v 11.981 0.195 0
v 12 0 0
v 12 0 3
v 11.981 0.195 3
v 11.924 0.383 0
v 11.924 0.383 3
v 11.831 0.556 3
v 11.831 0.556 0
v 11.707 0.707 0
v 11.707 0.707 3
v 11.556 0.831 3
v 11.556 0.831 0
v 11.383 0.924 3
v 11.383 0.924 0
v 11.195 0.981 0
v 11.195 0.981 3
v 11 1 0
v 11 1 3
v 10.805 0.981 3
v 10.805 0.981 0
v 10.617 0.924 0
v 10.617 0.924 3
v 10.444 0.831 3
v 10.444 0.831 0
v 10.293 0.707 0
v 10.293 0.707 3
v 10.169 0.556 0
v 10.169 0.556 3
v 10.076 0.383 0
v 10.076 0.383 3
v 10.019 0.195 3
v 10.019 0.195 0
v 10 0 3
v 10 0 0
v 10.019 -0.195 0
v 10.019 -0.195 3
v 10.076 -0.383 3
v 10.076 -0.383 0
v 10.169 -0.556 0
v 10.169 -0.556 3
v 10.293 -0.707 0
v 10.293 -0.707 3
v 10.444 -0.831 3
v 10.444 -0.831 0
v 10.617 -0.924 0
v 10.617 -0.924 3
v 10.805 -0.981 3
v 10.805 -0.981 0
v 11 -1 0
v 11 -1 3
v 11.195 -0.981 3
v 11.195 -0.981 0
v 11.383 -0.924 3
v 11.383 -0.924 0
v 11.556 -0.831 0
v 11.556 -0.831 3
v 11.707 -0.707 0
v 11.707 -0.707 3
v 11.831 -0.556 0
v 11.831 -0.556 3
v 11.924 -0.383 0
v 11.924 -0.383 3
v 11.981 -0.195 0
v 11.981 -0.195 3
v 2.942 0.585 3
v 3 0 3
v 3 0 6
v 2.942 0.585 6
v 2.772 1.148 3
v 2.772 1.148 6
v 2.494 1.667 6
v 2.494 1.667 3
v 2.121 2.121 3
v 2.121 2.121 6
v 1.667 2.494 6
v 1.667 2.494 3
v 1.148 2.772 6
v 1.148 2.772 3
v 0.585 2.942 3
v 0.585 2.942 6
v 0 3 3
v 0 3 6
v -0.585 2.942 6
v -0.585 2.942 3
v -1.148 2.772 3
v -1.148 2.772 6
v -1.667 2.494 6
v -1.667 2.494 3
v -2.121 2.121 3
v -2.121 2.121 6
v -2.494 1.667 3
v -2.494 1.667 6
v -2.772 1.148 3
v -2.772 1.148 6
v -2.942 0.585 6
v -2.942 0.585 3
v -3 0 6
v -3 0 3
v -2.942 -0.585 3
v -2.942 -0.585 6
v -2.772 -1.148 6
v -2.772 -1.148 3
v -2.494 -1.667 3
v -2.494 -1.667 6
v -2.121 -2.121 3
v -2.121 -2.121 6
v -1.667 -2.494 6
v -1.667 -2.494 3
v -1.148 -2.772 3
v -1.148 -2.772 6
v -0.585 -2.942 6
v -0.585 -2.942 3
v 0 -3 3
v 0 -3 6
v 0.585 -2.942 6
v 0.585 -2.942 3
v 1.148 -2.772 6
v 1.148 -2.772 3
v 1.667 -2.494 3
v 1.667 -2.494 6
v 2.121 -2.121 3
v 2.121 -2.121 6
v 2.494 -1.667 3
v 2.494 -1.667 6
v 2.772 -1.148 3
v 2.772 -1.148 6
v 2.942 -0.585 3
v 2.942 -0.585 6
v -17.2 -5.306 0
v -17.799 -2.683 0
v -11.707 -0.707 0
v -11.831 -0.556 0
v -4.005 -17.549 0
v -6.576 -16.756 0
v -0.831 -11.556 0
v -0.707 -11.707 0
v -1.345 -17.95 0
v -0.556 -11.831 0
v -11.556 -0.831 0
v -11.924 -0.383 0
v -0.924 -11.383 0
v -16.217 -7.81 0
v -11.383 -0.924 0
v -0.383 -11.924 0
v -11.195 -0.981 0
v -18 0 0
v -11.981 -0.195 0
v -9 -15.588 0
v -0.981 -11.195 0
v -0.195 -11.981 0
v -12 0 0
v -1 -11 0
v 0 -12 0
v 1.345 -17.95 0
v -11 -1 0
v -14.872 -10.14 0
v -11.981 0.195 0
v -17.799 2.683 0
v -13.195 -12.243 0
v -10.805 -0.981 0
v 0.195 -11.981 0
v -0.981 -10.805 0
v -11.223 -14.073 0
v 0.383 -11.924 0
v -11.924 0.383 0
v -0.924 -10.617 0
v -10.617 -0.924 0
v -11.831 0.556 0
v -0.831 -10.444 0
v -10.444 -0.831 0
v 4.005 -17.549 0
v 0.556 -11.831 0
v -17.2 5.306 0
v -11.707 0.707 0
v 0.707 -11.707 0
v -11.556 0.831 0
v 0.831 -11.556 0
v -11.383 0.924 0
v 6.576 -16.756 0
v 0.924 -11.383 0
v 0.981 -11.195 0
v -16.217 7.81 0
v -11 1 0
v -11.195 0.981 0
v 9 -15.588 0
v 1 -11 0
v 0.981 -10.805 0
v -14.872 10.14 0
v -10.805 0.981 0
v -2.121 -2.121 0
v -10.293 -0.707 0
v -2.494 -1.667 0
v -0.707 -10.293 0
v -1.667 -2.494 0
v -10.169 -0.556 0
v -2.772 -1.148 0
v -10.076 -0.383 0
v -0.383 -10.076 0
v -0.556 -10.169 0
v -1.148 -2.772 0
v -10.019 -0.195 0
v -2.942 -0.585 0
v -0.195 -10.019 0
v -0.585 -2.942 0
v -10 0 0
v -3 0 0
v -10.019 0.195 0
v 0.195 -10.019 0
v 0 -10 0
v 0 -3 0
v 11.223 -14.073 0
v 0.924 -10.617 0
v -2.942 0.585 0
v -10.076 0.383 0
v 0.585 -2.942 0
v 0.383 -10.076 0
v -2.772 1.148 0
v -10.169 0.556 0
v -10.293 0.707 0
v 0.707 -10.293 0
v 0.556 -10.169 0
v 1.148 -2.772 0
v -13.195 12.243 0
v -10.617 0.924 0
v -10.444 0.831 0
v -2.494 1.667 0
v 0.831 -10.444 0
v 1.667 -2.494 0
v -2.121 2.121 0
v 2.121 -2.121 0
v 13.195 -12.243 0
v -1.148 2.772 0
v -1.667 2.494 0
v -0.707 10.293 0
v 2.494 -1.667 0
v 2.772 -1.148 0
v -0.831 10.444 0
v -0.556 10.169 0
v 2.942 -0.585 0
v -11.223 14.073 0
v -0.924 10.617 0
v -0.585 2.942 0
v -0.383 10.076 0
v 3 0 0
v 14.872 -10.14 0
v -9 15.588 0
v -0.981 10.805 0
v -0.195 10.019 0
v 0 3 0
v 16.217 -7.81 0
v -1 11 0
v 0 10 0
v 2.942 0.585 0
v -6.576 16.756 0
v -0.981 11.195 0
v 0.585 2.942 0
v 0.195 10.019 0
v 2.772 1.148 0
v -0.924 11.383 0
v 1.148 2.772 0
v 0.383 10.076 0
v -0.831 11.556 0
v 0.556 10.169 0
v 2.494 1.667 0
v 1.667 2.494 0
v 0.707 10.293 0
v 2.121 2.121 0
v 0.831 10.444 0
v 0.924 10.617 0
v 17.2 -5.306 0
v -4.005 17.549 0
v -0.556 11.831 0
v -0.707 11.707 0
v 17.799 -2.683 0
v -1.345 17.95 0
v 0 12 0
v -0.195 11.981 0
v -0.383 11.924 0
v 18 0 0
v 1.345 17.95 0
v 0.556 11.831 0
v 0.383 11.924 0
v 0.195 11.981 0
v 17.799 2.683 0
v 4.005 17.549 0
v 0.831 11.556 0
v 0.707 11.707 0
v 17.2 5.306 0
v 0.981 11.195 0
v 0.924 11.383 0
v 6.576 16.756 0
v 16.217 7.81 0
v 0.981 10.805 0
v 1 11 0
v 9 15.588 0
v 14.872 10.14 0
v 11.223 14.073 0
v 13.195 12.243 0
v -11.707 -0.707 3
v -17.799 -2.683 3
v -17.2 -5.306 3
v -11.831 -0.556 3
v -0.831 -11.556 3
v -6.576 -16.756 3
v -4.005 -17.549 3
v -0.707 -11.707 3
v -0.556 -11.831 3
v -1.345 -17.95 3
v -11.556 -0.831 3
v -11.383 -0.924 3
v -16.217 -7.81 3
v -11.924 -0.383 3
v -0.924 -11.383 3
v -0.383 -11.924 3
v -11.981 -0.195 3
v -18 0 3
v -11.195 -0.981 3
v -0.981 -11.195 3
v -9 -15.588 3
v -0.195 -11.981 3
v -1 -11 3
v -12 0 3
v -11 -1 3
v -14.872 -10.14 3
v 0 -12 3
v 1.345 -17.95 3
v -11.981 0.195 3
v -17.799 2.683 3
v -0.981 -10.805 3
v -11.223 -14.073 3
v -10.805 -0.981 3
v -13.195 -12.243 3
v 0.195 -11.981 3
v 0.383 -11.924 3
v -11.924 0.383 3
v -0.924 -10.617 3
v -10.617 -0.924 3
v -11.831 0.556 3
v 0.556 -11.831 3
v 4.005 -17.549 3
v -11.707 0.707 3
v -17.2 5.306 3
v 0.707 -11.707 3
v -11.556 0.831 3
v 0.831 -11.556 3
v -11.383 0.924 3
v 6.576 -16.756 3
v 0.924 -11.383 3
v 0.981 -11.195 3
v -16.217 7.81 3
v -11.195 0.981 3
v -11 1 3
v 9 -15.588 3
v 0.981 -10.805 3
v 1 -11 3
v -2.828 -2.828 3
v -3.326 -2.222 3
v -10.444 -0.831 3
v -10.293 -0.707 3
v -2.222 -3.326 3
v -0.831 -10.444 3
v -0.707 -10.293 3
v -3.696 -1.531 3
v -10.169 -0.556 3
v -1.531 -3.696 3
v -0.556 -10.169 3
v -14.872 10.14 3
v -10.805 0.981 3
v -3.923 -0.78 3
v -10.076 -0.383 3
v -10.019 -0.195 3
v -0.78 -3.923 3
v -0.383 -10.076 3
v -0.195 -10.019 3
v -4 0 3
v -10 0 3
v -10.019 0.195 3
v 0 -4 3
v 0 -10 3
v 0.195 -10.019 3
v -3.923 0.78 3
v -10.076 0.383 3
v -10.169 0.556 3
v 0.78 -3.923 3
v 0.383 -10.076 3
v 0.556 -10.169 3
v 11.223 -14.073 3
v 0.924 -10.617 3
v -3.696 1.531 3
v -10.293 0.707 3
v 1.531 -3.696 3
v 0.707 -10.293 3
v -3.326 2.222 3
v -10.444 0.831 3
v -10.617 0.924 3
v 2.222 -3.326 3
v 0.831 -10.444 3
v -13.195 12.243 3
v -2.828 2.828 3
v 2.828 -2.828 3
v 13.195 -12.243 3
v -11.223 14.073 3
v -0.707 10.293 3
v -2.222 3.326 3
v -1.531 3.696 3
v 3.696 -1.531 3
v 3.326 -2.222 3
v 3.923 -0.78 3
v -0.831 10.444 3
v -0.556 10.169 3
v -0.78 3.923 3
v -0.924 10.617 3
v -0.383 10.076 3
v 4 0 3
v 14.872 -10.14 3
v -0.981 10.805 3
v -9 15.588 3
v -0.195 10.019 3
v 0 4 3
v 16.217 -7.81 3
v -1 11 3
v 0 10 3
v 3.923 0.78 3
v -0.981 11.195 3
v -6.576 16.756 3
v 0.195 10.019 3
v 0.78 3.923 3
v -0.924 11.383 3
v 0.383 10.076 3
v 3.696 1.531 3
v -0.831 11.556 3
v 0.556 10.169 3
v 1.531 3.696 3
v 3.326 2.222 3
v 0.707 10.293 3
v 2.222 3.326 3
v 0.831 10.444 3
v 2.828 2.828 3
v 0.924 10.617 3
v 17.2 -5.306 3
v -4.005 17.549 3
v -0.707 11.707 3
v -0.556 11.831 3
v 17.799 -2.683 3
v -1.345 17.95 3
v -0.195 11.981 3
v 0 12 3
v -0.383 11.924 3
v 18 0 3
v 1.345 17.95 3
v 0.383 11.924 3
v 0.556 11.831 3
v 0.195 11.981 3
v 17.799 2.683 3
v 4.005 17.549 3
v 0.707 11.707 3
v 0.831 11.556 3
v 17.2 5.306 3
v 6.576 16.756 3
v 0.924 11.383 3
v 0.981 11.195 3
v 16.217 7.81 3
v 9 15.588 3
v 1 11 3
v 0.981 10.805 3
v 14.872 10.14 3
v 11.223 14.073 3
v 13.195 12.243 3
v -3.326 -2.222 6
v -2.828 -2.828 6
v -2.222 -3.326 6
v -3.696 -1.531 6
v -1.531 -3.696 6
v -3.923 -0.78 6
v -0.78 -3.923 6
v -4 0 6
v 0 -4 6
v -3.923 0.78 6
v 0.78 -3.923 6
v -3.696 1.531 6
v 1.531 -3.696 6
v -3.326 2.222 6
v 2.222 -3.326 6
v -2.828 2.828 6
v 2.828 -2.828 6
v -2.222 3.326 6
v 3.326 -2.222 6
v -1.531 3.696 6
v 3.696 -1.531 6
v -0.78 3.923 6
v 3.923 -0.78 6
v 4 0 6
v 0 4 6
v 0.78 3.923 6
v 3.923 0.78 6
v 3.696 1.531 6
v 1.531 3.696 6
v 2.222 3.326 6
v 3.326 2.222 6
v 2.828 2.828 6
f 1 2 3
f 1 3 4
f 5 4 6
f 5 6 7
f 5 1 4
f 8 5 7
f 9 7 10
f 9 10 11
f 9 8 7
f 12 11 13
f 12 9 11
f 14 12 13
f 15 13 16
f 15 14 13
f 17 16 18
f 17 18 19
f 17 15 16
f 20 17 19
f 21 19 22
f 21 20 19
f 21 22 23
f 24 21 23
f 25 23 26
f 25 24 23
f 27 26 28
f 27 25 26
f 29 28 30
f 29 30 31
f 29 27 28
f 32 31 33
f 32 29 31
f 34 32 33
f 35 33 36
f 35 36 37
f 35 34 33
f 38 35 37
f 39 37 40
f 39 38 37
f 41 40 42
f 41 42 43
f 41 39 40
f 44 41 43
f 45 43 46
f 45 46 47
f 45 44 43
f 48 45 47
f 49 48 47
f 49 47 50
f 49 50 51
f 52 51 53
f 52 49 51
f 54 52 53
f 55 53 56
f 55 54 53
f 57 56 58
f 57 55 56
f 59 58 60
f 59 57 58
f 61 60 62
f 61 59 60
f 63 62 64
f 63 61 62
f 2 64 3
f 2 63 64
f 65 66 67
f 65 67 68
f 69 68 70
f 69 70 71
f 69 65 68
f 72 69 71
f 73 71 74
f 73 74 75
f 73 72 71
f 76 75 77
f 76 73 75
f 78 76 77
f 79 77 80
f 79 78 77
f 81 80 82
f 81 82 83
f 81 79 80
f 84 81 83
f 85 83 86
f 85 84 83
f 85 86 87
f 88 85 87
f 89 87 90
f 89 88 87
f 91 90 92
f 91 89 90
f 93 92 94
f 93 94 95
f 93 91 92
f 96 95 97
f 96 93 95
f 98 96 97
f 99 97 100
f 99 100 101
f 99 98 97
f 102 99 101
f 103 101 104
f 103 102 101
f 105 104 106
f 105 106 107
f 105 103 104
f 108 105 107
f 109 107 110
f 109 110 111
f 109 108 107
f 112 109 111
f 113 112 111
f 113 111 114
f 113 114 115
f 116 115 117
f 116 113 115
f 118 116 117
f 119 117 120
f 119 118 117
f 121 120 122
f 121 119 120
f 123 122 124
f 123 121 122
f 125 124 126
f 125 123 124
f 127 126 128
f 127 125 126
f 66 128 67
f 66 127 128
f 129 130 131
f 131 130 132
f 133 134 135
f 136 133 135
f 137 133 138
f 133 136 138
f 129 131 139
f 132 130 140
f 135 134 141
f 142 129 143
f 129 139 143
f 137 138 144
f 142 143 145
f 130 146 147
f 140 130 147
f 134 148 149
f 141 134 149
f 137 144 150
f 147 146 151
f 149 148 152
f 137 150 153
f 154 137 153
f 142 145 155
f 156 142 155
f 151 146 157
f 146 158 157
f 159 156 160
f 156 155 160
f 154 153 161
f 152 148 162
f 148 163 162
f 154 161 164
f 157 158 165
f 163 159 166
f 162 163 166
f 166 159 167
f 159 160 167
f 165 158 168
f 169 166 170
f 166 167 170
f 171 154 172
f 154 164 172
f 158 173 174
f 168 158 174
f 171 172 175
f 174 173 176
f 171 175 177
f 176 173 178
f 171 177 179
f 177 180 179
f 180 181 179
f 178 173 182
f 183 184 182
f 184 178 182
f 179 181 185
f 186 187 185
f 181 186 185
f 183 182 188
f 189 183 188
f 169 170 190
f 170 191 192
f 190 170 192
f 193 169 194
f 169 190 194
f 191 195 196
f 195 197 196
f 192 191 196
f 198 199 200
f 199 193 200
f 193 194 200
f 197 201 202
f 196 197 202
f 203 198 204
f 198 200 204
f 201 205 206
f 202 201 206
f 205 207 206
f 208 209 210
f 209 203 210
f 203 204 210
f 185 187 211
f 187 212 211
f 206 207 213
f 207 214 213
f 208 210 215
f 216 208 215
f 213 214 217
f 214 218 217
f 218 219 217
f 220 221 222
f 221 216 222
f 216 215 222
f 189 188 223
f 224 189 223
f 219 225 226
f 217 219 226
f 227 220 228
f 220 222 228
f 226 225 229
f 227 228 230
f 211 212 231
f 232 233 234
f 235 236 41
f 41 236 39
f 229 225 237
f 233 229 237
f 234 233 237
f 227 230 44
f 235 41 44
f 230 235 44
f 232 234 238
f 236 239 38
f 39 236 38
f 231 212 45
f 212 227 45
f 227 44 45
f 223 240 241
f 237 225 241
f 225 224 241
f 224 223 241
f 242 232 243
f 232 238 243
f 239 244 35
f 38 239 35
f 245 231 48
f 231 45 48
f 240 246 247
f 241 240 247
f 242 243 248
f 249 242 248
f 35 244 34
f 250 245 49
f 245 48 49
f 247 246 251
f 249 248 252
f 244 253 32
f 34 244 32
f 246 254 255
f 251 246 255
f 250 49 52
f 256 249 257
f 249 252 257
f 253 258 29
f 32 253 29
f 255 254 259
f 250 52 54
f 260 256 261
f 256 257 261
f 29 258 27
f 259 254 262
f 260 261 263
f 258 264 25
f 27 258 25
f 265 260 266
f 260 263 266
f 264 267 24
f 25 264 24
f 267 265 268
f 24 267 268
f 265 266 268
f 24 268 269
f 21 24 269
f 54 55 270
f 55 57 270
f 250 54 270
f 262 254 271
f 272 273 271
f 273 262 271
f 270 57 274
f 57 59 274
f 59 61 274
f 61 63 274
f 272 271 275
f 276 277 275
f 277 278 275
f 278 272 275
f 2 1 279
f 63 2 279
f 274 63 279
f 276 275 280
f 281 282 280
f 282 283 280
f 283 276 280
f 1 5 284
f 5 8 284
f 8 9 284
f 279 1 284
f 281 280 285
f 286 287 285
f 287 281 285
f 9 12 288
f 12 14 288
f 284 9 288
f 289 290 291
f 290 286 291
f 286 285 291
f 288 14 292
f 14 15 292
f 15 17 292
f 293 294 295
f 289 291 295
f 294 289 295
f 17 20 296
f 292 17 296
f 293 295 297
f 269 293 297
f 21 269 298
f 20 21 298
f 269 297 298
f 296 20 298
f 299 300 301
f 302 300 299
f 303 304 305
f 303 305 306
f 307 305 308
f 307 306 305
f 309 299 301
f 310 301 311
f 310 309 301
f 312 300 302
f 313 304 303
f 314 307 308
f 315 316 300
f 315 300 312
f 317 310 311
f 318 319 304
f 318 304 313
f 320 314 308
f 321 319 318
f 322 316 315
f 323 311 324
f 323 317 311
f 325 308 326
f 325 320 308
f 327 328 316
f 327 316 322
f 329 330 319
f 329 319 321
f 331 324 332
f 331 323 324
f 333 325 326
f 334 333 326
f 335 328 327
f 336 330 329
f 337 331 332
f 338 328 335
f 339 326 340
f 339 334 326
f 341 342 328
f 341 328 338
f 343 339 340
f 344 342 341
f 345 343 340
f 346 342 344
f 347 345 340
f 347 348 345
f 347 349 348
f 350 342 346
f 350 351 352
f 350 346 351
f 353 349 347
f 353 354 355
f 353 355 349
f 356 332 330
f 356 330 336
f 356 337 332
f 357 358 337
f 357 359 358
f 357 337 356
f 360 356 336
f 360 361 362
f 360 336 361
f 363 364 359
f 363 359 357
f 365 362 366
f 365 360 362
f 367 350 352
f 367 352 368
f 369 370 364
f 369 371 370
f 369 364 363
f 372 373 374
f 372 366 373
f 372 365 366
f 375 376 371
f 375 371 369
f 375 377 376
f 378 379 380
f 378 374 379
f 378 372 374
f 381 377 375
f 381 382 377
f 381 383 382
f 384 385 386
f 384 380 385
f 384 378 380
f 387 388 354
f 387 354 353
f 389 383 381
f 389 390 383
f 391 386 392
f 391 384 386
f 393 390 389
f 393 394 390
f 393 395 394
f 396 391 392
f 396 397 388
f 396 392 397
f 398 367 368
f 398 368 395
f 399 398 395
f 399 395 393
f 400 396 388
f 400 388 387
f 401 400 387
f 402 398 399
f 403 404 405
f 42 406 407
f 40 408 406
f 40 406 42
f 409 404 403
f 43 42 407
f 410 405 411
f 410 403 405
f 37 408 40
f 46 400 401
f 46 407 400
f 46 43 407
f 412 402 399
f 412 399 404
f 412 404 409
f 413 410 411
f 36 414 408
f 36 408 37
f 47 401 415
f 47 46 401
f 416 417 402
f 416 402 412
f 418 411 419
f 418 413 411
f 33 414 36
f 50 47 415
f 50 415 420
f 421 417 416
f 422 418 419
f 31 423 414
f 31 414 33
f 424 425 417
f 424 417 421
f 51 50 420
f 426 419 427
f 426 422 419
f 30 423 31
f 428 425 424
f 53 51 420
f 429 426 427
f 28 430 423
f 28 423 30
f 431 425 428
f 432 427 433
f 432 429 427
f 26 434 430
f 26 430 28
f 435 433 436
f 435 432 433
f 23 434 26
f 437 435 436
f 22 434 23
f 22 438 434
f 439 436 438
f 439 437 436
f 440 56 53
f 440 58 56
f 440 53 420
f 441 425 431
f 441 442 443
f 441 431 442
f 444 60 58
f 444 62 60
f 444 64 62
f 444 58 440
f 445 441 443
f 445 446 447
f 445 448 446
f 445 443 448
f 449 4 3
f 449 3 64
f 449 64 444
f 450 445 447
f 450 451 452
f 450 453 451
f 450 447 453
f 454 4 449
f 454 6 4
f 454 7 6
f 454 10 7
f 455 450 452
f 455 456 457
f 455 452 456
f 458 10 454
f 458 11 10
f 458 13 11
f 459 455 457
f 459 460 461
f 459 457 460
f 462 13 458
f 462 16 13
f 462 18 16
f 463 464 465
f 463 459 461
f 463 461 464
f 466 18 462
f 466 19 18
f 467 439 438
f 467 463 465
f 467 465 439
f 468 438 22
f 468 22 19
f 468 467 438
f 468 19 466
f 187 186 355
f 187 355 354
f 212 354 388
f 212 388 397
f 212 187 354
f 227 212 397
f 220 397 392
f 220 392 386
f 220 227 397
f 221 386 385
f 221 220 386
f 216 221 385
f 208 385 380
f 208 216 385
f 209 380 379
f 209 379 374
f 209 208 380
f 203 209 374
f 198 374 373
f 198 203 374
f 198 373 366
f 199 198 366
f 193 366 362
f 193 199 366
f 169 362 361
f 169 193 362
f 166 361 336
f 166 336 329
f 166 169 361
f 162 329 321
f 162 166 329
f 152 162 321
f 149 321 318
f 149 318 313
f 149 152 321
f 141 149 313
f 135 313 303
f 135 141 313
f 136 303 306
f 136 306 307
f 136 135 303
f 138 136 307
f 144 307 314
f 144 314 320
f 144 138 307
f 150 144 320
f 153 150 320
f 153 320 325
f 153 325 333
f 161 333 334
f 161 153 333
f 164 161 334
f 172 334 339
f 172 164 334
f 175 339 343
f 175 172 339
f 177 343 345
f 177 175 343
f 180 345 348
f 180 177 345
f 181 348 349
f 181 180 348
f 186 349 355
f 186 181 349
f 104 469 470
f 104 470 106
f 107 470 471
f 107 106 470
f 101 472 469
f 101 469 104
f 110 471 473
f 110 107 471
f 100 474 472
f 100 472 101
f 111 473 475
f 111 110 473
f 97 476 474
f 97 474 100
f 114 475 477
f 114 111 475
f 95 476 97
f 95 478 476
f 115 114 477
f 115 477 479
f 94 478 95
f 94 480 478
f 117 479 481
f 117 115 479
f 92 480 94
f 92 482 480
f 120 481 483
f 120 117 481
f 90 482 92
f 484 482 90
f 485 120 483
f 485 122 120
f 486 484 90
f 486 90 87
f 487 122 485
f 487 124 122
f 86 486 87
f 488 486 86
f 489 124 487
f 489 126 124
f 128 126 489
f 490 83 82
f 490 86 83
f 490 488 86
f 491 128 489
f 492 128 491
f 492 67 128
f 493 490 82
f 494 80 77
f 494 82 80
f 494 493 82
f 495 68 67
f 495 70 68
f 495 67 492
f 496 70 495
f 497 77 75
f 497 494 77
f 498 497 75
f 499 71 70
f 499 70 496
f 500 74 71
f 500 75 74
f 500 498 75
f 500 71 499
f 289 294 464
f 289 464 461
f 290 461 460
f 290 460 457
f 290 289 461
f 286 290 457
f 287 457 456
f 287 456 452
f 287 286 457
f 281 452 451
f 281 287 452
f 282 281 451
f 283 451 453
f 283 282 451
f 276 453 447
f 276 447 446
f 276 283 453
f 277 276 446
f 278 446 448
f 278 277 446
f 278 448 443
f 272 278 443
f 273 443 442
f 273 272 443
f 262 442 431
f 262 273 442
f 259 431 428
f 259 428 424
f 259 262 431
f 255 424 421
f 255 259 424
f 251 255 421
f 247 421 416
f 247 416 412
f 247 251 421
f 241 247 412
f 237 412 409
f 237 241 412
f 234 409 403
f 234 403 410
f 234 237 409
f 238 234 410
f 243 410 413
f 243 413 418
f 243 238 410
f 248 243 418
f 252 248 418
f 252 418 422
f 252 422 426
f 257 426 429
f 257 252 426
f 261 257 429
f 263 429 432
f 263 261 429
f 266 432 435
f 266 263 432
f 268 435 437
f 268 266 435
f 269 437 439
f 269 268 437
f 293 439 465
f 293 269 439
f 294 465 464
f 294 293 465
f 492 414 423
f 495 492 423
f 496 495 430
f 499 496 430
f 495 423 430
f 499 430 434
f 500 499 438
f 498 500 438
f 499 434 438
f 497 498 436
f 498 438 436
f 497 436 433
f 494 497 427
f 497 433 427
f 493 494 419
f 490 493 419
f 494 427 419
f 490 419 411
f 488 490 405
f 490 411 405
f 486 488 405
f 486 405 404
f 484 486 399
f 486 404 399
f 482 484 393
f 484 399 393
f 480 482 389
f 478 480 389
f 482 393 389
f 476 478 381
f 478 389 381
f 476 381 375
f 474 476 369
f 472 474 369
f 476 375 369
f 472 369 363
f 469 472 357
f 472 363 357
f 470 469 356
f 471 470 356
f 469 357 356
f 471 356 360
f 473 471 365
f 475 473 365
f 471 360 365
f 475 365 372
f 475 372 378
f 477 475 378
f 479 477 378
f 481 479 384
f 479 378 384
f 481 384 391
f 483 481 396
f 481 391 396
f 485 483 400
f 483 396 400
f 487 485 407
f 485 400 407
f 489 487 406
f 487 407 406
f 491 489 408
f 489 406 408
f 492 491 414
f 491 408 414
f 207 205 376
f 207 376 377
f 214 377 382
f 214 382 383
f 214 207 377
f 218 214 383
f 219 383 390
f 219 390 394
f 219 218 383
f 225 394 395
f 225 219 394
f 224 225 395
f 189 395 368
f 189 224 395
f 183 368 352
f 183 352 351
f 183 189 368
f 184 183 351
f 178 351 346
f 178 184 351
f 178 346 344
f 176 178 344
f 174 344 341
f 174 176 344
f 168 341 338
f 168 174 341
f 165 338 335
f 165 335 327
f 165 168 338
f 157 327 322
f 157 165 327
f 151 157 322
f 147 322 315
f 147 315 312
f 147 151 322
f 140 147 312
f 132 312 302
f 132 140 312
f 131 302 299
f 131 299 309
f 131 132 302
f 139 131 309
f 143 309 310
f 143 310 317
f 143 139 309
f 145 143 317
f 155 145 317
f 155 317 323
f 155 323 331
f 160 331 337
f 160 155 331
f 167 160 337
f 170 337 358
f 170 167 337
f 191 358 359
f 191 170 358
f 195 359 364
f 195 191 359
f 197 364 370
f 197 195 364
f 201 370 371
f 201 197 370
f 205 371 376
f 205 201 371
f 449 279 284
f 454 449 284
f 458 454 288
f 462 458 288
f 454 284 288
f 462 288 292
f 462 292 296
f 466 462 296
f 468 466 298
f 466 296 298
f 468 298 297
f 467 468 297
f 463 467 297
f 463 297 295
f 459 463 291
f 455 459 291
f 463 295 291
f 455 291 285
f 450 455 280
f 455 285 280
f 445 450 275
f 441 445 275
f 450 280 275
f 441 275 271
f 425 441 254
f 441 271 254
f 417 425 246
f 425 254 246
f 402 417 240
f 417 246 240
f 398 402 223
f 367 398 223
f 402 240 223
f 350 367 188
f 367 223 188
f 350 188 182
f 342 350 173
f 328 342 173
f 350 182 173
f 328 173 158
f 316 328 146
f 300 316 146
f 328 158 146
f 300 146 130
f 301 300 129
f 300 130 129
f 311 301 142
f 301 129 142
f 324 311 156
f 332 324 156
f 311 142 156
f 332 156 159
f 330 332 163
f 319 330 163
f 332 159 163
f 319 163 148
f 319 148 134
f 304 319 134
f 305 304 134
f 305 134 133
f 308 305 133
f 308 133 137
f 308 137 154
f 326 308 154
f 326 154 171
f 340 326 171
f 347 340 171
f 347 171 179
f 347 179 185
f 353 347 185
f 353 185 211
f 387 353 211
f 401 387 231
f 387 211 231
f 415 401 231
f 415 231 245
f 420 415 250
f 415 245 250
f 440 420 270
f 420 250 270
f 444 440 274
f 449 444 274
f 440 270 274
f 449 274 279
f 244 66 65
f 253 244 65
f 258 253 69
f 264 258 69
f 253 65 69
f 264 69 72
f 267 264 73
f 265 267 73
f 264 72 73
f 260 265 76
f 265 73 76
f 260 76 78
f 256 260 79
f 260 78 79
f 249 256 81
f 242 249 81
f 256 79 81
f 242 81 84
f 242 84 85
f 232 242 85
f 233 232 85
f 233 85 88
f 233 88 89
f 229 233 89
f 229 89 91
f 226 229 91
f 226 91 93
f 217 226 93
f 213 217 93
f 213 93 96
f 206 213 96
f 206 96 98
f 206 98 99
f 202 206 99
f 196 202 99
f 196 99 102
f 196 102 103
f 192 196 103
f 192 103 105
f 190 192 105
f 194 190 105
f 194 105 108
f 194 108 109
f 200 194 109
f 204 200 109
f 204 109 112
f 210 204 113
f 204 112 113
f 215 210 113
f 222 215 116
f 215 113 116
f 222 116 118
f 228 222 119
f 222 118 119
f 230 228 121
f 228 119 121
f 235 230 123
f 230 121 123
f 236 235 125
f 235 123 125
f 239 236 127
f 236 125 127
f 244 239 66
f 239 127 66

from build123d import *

# Parameters (mm, degrees)
SKETCH1_R           = 18
SKETCH1_R_2         = 1
BOSS_EXTRUDE1_DEPTH = 3
SKETCH2_R           = 4
SKETCH2_R_2         = 3
BOSS_EXTRUDE2_DEPTH = 3
SKETCH3_R           = 3
CUT_EXTRUDE1_DEPTH  = 5


with BuildPart() as part:
    # Sketch1 → Boss-Extrude1 (new body)
    with BuildSketch(Plane.XY):
        Circle(SKETCH1_R)
        with Locations((0, 11)):
            Circle(SKETCH1_R_2, mode=Mode.SUBTRACT)
        with Locations((11, 0)):
            Circle(SKETCH1_R_2, mode=Mode.SUBTRACT)
        with Locations((0, -11)):
            Circle(SKETCH1_R_2, mode=Mode.SUBTRACT)
        with Locations((-11, 0)):
            Circle(SKETCH1_R_2, mode=Mode.SUBTRACT)
    extrude(amount=BOSS_EXTRUDE1_DEPTH)

    # Sketch2 → Boss-Extrude2 (add)
    with BuildSketch(Plane.XY.offset(3)):
        Circle(SKETCH2_R)
        Circle(SKETCH2_R_2, mode=Mode.SUBTRACT)
    extrude(amount=BOSS_EXTRUDE2_DEPTH)

    # Sketch3 → Cut-Extrude1 (cut)
    with BuildSketch(Plane.XY.offset(3)):
        Circle(SKETCH3_R)
    extrude(amount=-CUT_EXTRUDE1_DEPTH, mode=Mode.SUBTRACT)


solid = part.part
